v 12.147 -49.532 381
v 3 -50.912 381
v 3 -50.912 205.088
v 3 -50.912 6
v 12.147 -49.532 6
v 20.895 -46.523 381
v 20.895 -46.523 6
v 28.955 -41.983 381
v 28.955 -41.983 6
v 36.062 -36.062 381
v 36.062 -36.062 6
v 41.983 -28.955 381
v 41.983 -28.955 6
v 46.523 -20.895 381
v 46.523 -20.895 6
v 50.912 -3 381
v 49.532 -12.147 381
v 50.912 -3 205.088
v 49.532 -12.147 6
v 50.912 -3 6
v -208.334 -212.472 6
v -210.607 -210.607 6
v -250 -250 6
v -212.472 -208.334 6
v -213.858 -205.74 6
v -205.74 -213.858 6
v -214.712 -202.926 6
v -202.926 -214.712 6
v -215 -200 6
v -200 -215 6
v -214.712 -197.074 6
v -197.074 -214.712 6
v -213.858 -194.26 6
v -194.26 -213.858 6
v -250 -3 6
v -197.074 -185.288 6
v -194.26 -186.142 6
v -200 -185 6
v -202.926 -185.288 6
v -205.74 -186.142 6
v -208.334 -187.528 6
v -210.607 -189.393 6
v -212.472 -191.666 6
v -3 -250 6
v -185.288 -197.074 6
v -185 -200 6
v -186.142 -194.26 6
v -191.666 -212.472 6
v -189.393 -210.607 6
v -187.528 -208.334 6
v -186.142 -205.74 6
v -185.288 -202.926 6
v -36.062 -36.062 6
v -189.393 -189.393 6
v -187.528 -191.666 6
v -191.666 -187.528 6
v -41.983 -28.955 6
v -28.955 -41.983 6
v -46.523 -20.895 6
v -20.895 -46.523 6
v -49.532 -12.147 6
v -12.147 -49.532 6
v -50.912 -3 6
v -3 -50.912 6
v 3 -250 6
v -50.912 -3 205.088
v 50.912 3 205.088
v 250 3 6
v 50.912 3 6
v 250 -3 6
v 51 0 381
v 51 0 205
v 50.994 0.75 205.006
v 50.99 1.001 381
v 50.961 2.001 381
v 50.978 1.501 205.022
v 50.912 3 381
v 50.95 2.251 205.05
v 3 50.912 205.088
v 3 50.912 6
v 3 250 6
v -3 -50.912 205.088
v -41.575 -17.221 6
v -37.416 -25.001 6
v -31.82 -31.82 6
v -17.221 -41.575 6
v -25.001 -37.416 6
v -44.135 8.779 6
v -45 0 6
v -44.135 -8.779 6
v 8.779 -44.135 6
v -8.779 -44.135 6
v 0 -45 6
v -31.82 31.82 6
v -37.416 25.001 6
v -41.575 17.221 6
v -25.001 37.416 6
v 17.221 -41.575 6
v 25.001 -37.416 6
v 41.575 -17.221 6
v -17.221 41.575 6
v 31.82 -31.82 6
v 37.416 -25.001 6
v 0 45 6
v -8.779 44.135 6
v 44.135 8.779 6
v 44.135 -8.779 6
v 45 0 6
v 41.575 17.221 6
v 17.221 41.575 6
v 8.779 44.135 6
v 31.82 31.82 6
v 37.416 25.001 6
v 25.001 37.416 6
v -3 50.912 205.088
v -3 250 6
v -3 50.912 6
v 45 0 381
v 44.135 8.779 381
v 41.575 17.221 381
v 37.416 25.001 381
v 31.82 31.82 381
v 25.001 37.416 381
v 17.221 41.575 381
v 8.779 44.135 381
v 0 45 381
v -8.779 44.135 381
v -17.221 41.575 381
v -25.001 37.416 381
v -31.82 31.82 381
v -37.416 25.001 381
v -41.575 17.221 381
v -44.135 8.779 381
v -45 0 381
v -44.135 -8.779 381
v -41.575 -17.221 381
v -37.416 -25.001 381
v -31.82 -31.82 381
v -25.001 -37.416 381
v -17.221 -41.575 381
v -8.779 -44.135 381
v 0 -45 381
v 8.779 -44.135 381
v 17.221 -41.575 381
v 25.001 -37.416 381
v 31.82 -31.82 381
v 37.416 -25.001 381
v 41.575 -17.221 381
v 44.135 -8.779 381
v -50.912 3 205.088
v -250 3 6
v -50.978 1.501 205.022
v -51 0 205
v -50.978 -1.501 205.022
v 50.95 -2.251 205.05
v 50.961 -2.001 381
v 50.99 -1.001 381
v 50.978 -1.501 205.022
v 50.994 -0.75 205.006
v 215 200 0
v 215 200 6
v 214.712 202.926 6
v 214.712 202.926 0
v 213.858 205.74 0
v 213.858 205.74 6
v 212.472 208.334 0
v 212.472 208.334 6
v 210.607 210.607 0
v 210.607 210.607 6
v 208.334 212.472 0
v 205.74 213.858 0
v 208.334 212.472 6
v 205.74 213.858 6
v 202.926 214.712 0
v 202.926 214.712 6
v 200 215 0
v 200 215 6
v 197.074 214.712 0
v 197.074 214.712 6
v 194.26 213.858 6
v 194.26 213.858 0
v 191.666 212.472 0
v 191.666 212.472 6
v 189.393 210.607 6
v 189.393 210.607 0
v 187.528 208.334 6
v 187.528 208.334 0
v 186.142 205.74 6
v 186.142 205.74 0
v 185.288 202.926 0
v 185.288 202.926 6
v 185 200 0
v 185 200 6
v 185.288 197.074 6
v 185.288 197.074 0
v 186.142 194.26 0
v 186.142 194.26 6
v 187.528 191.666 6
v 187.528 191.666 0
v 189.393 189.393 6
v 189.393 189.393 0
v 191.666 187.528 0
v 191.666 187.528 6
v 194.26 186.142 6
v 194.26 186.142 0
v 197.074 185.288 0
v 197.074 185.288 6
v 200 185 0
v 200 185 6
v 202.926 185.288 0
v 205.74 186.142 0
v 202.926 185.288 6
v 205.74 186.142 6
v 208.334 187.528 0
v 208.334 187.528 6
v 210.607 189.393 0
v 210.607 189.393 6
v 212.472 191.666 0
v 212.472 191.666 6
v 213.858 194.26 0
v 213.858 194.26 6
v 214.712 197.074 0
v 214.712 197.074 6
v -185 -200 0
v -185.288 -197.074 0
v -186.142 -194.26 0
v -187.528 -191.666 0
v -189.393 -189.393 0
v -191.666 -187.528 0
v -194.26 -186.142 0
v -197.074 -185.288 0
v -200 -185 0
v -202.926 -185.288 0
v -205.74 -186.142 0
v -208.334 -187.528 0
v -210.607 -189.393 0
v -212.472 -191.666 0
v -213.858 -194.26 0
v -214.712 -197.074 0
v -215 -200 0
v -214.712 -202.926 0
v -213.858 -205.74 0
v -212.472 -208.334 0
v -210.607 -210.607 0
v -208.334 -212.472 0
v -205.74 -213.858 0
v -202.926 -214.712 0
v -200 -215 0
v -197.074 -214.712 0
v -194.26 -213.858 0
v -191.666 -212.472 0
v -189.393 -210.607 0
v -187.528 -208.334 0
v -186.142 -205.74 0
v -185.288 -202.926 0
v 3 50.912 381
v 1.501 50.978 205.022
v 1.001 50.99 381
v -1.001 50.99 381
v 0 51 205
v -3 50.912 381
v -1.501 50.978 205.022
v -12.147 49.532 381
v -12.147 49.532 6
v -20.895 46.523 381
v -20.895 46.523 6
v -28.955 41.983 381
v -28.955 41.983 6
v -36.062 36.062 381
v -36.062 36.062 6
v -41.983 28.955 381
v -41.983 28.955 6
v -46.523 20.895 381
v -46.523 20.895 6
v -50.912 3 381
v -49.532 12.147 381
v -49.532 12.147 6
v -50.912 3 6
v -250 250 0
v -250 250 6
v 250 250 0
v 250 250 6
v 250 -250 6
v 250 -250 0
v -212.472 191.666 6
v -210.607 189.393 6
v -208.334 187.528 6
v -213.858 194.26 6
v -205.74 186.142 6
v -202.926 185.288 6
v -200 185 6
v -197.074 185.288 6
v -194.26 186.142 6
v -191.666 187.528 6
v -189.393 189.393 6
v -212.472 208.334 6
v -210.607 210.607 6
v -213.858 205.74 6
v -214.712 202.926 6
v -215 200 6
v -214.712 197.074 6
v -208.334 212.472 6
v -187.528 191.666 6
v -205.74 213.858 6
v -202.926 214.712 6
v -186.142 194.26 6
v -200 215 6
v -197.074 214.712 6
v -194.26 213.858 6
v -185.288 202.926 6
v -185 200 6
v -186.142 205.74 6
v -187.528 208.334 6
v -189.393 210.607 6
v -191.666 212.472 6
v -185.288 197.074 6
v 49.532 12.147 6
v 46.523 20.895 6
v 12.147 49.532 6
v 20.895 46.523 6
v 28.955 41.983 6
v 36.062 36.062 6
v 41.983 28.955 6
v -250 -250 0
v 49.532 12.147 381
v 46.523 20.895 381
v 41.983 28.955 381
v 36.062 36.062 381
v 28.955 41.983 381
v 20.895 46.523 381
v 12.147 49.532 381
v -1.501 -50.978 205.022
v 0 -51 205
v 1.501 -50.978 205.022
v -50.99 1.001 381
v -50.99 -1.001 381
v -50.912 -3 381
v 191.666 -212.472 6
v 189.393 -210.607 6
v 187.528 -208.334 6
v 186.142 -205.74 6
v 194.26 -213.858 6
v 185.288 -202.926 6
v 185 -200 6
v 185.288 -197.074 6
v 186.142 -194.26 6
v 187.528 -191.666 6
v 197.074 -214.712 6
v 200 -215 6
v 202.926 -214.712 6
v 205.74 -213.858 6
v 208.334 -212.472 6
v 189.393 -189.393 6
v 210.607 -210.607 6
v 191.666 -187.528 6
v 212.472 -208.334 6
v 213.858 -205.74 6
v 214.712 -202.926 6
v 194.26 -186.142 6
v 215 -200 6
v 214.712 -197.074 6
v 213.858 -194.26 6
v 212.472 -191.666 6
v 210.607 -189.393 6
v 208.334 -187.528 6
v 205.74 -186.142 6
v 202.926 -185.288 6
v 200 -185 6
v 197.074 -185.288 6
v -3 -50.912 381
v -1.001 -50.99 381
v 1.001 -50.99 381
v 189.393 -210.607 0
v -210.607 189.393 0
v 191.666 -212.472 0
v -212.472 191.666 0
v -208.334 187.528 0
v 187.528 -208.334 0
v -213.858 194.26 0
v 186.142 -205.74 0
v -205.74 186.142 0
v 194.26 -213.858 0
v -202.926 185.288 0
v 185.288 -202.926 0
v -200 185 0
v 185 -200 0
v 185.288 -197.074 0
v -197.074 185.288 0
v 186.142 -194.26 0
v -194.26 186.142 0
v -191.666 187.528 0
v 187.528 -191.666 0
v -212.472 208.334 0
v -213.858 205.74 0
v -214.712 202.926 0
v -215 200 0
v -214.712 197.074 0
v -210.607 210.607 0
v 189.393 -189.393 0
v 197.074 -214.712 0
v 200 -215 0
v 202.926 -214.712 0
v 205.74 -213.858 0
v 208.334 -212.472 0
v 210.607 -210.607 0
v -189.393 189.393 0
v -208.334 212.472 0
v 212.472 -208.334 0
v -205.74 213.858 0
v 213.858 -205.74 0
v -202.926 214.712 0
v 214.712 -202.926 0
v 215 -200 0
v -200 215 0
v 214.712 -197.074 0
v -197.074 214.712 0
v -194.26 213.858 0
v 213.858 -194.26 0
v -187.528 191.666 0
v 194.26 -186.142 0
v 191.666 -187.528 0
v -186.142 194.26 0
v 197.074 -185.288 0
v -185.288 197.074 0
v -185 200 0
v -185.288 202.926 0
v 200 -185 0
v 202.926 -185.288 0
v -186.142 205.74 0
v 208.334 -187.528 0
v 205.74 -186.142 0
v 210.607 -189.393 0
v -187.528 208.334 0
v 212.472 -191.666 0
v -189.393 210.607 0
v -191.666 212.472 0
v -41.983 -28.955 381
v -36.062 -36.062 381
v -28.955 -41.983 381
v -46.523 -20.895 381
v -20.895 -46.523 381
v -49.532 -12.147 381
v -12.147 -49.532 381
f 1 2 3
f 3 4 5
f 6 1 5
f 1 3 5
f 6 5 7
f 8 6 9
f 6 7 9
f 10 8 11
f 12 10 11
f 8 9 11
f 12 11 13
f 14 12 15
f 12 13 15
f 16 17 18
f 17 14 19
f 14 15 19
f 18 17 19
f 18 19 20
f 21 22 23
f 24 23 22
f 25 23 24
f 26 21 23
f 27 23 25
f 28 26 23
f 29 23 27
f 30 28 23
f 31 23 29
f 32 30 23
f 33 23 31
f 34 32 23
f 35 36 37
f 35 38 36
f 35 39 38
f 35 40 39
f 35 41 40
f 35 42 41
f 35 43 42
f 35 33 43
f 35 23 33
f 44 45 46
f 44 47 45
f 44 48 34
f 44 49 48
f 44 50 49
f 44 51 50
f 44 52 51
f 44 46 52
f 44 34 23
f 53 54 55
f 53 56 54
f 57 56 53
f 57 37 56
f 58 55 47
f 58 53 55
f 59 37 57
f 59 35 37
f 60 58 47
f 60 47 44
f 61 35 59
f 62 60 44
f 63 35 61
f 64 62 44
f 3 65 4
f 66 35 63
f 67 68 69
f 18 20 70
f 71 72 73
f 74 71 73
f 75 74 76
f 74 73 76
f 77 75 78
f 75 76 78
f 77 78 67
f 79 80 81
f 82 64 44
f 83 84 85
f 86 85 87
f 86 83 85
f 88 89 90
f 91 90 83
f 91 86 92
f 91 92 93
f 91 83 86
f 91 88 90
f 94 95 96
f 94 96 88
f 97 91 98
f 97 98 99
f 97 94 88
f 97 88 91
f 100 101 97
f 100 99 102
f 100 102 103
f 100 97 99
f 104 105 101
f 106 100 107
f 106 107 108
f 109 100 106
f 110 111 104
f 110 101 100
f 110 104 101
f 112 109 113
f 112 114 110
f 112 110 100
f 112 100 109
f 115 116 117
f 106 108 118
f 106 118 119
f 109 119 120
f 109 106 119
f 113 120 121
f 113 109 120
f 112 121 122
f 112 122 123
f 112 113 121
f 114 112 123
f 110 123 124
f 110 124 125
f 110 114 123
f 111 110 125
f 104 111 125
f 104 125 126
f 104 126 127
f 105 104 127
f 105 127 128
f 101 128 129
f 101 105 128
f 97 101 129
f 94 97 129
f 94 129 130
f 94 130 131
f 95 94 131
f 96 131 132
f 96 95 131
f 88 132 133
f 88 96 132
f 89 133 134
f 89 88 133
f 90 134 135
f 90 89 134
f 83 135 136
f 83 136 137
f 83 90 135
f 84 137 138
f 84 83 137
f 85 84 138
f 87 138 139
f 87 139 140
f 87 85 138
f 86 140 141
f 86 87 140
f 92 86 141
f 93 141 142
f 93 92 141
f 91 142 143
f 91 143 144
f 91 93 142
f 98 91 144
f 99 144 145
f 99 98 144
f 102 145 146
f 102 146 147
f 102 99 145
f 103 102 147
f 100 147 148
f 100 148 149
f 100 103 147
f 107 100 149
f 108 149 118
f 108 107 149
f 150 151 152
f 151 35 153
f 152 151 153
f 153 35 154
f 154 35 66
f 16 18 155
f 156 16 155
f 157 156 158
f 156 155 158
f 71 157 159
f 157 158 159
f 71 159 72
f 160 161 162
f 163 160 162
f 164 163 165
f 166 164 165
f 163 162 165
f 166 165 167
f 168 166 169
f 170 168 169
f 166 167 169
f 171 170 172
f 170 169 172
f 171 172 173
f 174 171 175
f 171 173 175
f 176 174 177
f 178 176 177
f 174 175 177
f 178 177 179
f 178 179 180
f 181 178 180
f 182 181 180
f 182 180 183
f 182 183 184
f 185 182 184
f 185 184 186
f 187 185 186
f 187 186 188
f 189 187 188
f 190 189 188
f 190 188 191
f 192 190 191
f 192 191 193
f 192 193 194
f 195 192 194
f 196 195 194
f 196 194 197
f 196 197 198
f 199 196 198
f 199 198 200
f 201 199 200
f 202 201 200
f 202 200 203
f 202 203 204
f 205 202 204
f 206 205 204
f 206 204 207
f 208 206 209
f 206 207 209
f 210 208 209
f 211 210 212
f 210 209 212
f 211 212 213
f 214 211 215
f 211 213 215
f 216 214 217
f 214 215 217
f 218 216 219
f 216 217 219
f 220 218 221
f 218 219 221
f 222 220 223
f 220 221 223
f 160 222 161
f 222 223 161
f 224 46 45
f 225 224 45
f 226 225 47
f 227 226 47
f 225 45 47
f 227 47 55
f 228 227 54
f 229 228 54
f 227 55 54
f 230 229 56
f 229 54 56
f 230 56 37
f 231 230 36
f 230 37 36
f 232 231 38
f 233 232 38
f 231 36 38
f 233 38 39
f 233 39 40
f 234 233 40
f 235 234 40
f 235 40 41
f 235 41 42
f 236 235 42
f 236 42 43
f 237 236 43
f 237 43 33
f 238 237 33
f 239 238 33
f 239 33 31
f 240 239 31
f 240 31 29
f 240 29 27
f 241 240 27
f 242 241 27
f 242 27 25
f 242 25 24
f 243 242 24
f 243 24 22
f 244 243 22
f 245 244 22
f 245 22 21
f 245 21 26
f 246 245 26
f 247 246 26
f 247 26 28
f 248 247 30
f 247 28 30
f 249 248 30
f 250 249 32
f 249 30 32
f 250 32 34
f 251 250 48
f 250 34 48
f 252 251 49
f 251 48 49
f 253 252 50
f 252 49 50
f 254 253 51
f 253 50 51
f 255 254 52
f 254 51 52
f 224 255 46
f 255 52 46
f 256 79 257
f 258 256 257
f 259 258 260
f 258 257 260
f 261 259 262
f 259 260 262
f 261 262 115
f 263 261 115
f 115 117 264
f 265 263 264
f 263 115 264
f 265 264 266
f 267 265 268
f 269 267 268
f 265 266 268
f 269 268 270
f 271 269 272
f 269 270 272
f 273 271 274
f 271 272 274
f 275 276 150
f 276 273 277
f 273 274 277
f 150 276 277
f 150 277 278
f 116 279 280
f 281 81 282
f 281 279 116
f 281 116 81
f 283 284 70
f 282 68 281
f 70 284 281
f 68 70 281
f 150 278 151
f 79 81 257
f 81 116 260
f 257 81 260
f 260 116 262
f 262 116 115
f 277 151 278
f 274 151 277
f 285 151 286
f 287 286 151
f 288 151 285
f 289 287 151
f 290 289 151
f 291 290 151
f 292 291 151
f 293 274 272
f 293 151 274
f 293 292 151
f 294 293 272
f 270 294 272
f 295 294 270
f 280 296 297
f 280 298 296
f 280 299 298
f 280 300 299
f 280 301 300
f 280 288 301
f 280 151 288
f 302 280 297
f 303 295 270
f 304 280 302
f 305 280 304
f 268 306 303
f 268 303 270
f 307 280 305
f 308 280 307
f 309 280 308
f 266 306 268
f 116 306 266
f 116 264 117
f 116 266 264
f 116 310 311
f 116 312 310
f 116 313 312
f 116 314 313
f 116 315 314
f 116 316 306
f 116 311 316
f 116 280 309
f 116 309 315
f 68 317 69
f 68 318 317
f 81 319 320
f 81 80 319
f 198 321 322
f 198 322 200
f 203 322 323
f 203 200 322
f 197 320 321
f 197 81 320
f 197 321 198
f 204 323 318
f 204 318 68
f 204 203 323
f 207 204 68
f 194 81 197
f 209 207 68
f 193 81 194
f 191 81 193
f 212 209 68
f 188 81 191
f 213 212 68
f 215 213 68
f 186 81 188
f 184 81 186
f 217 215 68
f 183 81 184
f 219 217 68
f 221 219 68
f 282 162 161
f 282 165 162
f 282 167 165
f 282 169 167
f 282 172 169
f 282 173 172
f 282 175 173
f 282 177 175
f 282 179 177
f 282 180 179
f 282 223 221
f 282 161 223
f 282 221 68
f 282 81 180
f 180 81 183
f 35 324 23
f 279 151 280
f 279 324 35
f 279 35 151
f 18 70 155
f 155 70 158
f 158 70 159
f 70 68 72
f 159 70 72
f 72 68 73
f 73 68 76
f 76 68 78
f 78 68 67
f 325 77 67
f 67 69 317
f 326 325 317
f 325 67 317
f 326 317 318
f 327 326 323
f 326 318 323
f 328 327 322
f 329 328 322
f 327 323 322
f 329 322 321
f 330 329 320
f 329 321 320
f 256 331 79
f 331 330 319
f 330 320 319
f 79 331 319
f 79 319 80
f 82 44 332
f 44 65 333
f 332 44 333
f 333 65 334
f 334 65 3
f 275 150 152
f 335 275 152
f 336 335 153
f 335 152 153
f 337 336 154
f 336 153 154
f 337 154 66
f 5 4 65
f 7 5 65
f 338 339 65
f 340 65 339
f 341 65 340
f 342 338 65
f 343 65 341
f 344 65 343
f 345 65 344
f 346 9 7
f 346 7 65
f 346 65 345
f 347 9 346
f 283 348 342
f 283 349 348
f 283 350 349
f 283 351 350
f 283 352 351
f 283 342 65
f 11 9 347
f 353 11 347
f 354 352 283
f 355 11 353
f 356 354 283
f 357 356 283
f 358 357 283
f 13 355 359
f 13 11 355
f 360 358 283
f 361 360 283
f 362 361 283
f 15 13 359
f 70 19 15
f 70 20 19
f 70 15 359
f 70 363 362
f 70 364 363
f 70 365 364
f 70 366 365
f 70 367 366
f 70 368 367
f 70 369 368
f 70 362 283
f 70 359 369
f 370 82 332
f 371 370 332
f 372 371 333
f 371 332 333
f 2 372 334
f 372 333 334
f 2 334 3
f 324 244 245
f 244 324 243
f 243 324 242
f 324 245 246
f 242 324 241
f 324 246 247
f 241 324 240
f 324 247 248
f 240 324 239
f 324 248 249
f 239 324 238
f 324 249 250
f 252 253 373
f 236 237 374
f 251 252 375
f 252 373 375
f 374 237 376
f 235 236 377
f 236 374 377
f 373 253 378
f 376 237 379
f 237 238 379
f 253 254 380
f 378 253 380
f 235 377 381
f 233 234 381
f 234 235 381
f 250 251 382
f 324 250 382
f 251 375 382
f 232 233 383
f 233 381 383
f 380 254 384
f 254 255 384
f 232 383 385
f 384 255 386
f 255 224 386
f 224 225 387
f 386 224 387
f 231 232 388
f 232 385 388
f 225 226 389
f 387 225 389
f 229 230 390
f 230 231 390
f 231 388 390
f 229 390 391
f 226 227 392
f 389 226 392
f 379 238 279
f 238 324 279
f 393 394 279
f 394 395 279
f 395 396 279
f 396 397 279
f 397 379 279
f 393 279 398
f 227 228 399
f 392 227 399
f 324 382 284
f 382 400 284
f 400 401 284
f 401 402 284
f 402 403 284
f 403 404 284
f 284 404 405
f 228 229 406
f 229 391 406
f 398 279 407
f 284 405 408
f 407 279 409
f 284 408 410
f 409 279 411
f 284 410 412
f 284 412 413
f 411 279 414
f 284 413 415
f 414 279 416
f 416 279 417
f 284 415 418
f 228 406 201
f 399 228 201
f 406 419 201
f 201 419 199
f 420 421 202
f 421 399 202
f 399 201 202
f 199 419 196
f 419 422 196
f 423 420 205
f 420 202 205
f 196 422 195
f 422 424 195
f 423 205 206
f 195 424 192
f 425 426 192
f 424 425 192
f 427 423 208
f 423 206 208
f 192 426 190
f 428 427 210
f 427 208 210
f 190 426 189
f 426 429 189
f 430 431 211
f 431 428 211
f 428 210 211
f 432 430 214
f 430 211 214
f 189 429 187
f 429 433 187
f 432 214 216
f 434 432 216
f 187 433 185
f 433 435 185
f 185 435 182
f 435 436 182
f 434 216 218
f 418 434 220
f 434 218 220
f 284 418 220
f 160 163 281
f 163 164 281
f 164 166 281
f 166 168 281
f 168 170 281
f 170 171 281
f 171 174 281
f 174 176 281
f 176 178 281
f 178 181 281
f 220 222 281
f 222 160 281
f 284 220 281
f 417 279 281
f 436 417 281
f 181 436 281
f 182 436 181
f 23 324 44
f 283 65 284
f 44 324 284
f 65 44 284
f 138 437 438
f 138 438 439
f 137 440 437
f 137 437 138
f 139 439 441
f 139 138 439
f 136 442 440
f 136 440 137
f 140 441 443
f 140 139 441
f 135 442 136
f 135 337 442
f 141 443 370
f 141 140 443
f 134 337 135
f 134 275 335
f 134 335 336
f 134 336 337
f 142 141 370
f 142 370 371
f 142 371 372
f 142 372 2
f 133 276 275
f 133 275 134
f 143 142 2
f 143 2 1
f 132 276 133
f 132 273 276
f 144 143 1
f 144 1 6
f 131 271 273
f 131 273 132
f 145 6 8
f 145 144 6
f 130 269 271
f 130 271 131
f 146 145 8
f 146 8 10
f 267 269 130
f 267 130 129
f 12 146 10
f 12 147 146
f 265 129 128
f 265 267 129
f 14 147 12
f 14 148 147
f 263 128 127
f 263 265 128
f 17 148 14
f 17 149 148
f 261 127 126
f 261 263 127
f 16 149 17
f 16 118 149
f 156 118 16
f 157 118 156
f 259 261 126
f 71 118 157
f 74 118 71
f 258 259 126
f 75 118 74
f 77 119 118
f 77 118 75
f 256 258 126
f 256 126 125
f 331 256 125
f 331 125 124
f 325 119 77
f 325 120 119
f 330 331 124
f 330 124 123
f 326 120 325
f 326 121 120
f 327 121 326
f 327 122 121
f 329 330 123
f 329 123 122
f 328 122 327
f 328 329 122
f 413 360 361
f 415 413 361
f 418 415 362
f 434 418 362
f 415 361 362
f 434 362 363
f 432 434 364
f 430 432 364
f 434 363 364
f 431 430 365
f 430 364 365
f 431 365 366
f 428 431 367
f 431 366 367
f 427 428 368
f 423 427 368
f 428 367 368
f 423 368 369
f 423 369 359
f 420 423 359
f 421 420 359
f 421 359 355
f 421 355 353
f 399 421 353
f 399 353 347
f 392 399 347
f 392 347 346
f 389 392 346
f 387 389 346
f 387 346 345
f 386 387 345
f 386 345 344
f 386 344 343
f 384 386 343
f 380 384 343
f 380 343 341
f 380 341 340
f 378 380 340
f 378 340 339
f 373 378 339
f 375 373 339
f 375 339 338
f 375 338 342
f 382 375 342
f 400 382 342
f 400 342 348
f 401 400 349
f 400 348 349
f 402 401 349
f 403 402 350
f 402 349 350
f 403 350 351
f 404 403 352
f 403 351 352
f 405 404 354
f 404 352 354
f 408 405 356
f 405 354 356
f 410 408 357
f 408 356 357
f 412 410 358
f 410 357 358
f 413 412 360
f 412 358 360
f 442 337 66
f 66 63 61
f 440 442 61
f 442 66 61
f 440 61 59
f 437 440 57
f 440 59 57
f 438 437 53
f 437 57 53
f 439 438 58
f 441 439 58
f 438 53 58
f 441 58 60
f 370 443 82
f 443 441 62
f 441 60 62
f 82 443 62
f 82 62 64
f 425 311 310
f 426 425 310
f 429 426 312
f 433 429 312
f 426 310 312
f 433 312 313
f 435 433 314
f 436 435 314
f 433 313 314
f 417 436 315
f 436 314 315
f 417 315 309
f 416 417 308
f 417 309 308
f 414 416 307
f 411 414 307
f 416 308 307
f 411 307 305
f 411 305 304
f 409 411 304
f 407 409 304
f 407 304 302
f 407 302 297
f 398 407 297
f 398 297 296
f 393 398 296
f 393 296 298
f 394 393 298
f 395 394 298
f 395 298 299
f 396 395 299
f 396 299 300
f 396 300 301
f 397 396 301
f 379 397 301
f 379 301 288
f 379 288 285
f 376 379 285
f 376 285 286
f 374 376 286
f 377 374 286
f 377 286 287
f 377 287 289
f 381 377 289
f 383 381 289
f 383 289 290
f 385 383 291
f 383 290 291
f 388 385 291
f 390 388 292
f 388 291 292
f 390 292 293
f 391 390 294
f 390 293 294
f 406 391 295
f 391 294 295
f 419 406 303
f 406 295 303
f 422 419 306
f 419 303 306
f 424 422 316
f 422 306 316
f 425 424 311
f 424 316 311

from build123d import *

# Parameters (mm, degrees)
F0_W      = 500
F0_H      = 500
F1_DEPTH  = 6
F3_DEPTH  = 200.09
F5_DEPTH  = 25
F8_DEPTH  = 25
F9_DEPTH  = 25
F2_R      = 15
F10_DEPTH = 25
F12_DEPTH = 25
F2_R_2    = 45
F13_DEPTH = 375


with BuildPart() as f1:
    # F0 (on Top) → F1 (new body)
    with BuildSketch(Plane.XY):
        Rectangle(F0_W, F0_H)
    extrude(amount=F1_DEPTH)

    # F2 (on face) → F3 (join)
    with BuildSketch(Plane.XY.offset(6)):
        with BuildLine():
            ThreePointArc((-3, 50.9116882454), (0, 51), (3, 50.9116882454))
            Line((3, 50.9116882454), (3, 250))
            Line((3, 250), (-3, 250))
            Line((-3, 250), (-3, 50.9116882454))
        make_face()
        with BuildLine():
            ThreePointArc((50.9116882454, 3), (50.9779172805, 1.5006497731), (51, 0))
            ThreePointArc((51, 0), (50.9779172805, -1.5006497731), (50.9116882454, -3))
            Line((50.9116882454, -3), (250, -3))
            Line((250, -3), (250, 3))
            Line((250, 3), (50.9116882454, 3))
        make_face()
        with BuildLine():
            ThreePointArc((-50.9116881716, -3.0000012524), (-51, -1.2546e-06), (-50.9116883192, 2.9999987476))
            Line((-50.9116883192, 2.9999987476), (-250, 3))
            Line((-250, 3), (-250, -3))
            Line((-250, -3), (-50.9116881716, -3.0000012524))
        make_face()
        with BuildLine():
            Line((3, -250), (3, -50.9116882454))
            ThreePointArc((3, -50.9116882454), (0, -51), (-3, -50.9116882454))
            Line((-3, -50.9116882454), (-3, -250))
            Line((-3, -250), (3, -250))
        make_face()
    extrude(amount=F3_DEPTH)

    # F4 (on face) → F5 (cut)
    with BuildSketch(Plane(origin=(0, 3, 0), x_dir=(-1, 0, 0), z_dir=(0, 1, 0))):
        Polygon((-250, 206.09), (-250, 6), (-50.9116882454, 205.0883117546), (-50.9116882454, 206.09), align=None)
    extrude(amount=-F5_DEPTH, mode=Mode.SUBTRACT)

    # F6 (on face) → F8 (cut)
    with BuildSketch(Plane.YZ.offset(3)):
        Polygon((-250, 206.09), (-250, 6), (-50.9116882454, 205.0883117546), (-50.9116882454, 206.09), align=None)
    extrude(amount=-F8_DEPTH, mode=Mode.SUBTRACT)

    # F7 (on face) → F9 (cut)
    with BuildSketch(Plane(origin=(-3, 0, 0), x_dir=(0, -1, 0), z_dir=(-1, 0, 0))):
        Polygon((-250, 206.09), (-250, 6), (-50.9116882454, 205.0883117546), (-50.9116882454, 206.09), align=None)
    extrude(amount=-F9_DEPTH, mode=Mode.SUBTRACT)

    # F2 (on face) → F10 (cut)
    with BuildSketch(Plane.XY.offset(6)):
        with Locations((-200, -200)):
            Circle(F2_R)
        with Locations((200, -200)):
            Circle(F2_R)
        with Locations((200, 200)):
            Circle(F2_R)
        with Locations((-200, 200)):
            Circle(F2_R)
    extrude(amount=-F10_DEPTH, mode=Mode.SUBTRACT)

    # F11 (on face) → F12 (cut)
    with BuildSketch(Plane(origin=(-1.89e-08, -3.0000015726, 0), x_dir=(1, -6.3e-09, 0), z_dir=(-6.3e-09, -1, 0))):
        Polygon((-249.9999999811, 206.09), (-249.9999999811, 6), (-50.9116881528, 205.0883118284), (-50.9116881528, 206.09), align=None)
    extrude(amount=-F12_DEPTH, mode=Mode.SUBTRACT)

    # F2 (on face) → F13 (join)
    with BuildSketch(Plane.XY.offset(6)):
        with BuildLine():
            ThreePointArc((50.9116882454, -3), (50.9779172805, -1.5006497731), (51, 0))
            ThreePointArc((51, 0), (50.9779172805, 1.5006497731), (50.9116882454, 3))
            ThreePointArc((50.9116882454, 3), (36.0624458405, 36.0624458405), (3, 50.9116882454))
            ThreePointArc((3, 50.9116882454), (0, 51), (-3, 50.9116882454))
            ThreePointArc((-3, 50.9116882454), (-36.0624462841, 36.062445397), (-50.9116883192, 2.9999987476))
            ThreePointArc((-50.9116883192, 2.9999987476), (-51, -1.2546e-06), (-50.9116881716, -3.0000012524))
            ThreePointArc((-50.9116881716, -3.0000012524), (-36.062445397, -36.0624462841), (-3, -50.9116882454))
            ThreePointArc((-3, -50.9116882454), (0, -51), (3, -50.9116882454))
            ThreePointArc((3, -50.9116882454), (36.0624458405, -36.0624458405), (50.9116882454, -3))
        make_face()
        Circle(F2_R_2, mode=Mode.SUBTRACT)
    extrude(amount=F13_DEPTH)


solid = f1.part
